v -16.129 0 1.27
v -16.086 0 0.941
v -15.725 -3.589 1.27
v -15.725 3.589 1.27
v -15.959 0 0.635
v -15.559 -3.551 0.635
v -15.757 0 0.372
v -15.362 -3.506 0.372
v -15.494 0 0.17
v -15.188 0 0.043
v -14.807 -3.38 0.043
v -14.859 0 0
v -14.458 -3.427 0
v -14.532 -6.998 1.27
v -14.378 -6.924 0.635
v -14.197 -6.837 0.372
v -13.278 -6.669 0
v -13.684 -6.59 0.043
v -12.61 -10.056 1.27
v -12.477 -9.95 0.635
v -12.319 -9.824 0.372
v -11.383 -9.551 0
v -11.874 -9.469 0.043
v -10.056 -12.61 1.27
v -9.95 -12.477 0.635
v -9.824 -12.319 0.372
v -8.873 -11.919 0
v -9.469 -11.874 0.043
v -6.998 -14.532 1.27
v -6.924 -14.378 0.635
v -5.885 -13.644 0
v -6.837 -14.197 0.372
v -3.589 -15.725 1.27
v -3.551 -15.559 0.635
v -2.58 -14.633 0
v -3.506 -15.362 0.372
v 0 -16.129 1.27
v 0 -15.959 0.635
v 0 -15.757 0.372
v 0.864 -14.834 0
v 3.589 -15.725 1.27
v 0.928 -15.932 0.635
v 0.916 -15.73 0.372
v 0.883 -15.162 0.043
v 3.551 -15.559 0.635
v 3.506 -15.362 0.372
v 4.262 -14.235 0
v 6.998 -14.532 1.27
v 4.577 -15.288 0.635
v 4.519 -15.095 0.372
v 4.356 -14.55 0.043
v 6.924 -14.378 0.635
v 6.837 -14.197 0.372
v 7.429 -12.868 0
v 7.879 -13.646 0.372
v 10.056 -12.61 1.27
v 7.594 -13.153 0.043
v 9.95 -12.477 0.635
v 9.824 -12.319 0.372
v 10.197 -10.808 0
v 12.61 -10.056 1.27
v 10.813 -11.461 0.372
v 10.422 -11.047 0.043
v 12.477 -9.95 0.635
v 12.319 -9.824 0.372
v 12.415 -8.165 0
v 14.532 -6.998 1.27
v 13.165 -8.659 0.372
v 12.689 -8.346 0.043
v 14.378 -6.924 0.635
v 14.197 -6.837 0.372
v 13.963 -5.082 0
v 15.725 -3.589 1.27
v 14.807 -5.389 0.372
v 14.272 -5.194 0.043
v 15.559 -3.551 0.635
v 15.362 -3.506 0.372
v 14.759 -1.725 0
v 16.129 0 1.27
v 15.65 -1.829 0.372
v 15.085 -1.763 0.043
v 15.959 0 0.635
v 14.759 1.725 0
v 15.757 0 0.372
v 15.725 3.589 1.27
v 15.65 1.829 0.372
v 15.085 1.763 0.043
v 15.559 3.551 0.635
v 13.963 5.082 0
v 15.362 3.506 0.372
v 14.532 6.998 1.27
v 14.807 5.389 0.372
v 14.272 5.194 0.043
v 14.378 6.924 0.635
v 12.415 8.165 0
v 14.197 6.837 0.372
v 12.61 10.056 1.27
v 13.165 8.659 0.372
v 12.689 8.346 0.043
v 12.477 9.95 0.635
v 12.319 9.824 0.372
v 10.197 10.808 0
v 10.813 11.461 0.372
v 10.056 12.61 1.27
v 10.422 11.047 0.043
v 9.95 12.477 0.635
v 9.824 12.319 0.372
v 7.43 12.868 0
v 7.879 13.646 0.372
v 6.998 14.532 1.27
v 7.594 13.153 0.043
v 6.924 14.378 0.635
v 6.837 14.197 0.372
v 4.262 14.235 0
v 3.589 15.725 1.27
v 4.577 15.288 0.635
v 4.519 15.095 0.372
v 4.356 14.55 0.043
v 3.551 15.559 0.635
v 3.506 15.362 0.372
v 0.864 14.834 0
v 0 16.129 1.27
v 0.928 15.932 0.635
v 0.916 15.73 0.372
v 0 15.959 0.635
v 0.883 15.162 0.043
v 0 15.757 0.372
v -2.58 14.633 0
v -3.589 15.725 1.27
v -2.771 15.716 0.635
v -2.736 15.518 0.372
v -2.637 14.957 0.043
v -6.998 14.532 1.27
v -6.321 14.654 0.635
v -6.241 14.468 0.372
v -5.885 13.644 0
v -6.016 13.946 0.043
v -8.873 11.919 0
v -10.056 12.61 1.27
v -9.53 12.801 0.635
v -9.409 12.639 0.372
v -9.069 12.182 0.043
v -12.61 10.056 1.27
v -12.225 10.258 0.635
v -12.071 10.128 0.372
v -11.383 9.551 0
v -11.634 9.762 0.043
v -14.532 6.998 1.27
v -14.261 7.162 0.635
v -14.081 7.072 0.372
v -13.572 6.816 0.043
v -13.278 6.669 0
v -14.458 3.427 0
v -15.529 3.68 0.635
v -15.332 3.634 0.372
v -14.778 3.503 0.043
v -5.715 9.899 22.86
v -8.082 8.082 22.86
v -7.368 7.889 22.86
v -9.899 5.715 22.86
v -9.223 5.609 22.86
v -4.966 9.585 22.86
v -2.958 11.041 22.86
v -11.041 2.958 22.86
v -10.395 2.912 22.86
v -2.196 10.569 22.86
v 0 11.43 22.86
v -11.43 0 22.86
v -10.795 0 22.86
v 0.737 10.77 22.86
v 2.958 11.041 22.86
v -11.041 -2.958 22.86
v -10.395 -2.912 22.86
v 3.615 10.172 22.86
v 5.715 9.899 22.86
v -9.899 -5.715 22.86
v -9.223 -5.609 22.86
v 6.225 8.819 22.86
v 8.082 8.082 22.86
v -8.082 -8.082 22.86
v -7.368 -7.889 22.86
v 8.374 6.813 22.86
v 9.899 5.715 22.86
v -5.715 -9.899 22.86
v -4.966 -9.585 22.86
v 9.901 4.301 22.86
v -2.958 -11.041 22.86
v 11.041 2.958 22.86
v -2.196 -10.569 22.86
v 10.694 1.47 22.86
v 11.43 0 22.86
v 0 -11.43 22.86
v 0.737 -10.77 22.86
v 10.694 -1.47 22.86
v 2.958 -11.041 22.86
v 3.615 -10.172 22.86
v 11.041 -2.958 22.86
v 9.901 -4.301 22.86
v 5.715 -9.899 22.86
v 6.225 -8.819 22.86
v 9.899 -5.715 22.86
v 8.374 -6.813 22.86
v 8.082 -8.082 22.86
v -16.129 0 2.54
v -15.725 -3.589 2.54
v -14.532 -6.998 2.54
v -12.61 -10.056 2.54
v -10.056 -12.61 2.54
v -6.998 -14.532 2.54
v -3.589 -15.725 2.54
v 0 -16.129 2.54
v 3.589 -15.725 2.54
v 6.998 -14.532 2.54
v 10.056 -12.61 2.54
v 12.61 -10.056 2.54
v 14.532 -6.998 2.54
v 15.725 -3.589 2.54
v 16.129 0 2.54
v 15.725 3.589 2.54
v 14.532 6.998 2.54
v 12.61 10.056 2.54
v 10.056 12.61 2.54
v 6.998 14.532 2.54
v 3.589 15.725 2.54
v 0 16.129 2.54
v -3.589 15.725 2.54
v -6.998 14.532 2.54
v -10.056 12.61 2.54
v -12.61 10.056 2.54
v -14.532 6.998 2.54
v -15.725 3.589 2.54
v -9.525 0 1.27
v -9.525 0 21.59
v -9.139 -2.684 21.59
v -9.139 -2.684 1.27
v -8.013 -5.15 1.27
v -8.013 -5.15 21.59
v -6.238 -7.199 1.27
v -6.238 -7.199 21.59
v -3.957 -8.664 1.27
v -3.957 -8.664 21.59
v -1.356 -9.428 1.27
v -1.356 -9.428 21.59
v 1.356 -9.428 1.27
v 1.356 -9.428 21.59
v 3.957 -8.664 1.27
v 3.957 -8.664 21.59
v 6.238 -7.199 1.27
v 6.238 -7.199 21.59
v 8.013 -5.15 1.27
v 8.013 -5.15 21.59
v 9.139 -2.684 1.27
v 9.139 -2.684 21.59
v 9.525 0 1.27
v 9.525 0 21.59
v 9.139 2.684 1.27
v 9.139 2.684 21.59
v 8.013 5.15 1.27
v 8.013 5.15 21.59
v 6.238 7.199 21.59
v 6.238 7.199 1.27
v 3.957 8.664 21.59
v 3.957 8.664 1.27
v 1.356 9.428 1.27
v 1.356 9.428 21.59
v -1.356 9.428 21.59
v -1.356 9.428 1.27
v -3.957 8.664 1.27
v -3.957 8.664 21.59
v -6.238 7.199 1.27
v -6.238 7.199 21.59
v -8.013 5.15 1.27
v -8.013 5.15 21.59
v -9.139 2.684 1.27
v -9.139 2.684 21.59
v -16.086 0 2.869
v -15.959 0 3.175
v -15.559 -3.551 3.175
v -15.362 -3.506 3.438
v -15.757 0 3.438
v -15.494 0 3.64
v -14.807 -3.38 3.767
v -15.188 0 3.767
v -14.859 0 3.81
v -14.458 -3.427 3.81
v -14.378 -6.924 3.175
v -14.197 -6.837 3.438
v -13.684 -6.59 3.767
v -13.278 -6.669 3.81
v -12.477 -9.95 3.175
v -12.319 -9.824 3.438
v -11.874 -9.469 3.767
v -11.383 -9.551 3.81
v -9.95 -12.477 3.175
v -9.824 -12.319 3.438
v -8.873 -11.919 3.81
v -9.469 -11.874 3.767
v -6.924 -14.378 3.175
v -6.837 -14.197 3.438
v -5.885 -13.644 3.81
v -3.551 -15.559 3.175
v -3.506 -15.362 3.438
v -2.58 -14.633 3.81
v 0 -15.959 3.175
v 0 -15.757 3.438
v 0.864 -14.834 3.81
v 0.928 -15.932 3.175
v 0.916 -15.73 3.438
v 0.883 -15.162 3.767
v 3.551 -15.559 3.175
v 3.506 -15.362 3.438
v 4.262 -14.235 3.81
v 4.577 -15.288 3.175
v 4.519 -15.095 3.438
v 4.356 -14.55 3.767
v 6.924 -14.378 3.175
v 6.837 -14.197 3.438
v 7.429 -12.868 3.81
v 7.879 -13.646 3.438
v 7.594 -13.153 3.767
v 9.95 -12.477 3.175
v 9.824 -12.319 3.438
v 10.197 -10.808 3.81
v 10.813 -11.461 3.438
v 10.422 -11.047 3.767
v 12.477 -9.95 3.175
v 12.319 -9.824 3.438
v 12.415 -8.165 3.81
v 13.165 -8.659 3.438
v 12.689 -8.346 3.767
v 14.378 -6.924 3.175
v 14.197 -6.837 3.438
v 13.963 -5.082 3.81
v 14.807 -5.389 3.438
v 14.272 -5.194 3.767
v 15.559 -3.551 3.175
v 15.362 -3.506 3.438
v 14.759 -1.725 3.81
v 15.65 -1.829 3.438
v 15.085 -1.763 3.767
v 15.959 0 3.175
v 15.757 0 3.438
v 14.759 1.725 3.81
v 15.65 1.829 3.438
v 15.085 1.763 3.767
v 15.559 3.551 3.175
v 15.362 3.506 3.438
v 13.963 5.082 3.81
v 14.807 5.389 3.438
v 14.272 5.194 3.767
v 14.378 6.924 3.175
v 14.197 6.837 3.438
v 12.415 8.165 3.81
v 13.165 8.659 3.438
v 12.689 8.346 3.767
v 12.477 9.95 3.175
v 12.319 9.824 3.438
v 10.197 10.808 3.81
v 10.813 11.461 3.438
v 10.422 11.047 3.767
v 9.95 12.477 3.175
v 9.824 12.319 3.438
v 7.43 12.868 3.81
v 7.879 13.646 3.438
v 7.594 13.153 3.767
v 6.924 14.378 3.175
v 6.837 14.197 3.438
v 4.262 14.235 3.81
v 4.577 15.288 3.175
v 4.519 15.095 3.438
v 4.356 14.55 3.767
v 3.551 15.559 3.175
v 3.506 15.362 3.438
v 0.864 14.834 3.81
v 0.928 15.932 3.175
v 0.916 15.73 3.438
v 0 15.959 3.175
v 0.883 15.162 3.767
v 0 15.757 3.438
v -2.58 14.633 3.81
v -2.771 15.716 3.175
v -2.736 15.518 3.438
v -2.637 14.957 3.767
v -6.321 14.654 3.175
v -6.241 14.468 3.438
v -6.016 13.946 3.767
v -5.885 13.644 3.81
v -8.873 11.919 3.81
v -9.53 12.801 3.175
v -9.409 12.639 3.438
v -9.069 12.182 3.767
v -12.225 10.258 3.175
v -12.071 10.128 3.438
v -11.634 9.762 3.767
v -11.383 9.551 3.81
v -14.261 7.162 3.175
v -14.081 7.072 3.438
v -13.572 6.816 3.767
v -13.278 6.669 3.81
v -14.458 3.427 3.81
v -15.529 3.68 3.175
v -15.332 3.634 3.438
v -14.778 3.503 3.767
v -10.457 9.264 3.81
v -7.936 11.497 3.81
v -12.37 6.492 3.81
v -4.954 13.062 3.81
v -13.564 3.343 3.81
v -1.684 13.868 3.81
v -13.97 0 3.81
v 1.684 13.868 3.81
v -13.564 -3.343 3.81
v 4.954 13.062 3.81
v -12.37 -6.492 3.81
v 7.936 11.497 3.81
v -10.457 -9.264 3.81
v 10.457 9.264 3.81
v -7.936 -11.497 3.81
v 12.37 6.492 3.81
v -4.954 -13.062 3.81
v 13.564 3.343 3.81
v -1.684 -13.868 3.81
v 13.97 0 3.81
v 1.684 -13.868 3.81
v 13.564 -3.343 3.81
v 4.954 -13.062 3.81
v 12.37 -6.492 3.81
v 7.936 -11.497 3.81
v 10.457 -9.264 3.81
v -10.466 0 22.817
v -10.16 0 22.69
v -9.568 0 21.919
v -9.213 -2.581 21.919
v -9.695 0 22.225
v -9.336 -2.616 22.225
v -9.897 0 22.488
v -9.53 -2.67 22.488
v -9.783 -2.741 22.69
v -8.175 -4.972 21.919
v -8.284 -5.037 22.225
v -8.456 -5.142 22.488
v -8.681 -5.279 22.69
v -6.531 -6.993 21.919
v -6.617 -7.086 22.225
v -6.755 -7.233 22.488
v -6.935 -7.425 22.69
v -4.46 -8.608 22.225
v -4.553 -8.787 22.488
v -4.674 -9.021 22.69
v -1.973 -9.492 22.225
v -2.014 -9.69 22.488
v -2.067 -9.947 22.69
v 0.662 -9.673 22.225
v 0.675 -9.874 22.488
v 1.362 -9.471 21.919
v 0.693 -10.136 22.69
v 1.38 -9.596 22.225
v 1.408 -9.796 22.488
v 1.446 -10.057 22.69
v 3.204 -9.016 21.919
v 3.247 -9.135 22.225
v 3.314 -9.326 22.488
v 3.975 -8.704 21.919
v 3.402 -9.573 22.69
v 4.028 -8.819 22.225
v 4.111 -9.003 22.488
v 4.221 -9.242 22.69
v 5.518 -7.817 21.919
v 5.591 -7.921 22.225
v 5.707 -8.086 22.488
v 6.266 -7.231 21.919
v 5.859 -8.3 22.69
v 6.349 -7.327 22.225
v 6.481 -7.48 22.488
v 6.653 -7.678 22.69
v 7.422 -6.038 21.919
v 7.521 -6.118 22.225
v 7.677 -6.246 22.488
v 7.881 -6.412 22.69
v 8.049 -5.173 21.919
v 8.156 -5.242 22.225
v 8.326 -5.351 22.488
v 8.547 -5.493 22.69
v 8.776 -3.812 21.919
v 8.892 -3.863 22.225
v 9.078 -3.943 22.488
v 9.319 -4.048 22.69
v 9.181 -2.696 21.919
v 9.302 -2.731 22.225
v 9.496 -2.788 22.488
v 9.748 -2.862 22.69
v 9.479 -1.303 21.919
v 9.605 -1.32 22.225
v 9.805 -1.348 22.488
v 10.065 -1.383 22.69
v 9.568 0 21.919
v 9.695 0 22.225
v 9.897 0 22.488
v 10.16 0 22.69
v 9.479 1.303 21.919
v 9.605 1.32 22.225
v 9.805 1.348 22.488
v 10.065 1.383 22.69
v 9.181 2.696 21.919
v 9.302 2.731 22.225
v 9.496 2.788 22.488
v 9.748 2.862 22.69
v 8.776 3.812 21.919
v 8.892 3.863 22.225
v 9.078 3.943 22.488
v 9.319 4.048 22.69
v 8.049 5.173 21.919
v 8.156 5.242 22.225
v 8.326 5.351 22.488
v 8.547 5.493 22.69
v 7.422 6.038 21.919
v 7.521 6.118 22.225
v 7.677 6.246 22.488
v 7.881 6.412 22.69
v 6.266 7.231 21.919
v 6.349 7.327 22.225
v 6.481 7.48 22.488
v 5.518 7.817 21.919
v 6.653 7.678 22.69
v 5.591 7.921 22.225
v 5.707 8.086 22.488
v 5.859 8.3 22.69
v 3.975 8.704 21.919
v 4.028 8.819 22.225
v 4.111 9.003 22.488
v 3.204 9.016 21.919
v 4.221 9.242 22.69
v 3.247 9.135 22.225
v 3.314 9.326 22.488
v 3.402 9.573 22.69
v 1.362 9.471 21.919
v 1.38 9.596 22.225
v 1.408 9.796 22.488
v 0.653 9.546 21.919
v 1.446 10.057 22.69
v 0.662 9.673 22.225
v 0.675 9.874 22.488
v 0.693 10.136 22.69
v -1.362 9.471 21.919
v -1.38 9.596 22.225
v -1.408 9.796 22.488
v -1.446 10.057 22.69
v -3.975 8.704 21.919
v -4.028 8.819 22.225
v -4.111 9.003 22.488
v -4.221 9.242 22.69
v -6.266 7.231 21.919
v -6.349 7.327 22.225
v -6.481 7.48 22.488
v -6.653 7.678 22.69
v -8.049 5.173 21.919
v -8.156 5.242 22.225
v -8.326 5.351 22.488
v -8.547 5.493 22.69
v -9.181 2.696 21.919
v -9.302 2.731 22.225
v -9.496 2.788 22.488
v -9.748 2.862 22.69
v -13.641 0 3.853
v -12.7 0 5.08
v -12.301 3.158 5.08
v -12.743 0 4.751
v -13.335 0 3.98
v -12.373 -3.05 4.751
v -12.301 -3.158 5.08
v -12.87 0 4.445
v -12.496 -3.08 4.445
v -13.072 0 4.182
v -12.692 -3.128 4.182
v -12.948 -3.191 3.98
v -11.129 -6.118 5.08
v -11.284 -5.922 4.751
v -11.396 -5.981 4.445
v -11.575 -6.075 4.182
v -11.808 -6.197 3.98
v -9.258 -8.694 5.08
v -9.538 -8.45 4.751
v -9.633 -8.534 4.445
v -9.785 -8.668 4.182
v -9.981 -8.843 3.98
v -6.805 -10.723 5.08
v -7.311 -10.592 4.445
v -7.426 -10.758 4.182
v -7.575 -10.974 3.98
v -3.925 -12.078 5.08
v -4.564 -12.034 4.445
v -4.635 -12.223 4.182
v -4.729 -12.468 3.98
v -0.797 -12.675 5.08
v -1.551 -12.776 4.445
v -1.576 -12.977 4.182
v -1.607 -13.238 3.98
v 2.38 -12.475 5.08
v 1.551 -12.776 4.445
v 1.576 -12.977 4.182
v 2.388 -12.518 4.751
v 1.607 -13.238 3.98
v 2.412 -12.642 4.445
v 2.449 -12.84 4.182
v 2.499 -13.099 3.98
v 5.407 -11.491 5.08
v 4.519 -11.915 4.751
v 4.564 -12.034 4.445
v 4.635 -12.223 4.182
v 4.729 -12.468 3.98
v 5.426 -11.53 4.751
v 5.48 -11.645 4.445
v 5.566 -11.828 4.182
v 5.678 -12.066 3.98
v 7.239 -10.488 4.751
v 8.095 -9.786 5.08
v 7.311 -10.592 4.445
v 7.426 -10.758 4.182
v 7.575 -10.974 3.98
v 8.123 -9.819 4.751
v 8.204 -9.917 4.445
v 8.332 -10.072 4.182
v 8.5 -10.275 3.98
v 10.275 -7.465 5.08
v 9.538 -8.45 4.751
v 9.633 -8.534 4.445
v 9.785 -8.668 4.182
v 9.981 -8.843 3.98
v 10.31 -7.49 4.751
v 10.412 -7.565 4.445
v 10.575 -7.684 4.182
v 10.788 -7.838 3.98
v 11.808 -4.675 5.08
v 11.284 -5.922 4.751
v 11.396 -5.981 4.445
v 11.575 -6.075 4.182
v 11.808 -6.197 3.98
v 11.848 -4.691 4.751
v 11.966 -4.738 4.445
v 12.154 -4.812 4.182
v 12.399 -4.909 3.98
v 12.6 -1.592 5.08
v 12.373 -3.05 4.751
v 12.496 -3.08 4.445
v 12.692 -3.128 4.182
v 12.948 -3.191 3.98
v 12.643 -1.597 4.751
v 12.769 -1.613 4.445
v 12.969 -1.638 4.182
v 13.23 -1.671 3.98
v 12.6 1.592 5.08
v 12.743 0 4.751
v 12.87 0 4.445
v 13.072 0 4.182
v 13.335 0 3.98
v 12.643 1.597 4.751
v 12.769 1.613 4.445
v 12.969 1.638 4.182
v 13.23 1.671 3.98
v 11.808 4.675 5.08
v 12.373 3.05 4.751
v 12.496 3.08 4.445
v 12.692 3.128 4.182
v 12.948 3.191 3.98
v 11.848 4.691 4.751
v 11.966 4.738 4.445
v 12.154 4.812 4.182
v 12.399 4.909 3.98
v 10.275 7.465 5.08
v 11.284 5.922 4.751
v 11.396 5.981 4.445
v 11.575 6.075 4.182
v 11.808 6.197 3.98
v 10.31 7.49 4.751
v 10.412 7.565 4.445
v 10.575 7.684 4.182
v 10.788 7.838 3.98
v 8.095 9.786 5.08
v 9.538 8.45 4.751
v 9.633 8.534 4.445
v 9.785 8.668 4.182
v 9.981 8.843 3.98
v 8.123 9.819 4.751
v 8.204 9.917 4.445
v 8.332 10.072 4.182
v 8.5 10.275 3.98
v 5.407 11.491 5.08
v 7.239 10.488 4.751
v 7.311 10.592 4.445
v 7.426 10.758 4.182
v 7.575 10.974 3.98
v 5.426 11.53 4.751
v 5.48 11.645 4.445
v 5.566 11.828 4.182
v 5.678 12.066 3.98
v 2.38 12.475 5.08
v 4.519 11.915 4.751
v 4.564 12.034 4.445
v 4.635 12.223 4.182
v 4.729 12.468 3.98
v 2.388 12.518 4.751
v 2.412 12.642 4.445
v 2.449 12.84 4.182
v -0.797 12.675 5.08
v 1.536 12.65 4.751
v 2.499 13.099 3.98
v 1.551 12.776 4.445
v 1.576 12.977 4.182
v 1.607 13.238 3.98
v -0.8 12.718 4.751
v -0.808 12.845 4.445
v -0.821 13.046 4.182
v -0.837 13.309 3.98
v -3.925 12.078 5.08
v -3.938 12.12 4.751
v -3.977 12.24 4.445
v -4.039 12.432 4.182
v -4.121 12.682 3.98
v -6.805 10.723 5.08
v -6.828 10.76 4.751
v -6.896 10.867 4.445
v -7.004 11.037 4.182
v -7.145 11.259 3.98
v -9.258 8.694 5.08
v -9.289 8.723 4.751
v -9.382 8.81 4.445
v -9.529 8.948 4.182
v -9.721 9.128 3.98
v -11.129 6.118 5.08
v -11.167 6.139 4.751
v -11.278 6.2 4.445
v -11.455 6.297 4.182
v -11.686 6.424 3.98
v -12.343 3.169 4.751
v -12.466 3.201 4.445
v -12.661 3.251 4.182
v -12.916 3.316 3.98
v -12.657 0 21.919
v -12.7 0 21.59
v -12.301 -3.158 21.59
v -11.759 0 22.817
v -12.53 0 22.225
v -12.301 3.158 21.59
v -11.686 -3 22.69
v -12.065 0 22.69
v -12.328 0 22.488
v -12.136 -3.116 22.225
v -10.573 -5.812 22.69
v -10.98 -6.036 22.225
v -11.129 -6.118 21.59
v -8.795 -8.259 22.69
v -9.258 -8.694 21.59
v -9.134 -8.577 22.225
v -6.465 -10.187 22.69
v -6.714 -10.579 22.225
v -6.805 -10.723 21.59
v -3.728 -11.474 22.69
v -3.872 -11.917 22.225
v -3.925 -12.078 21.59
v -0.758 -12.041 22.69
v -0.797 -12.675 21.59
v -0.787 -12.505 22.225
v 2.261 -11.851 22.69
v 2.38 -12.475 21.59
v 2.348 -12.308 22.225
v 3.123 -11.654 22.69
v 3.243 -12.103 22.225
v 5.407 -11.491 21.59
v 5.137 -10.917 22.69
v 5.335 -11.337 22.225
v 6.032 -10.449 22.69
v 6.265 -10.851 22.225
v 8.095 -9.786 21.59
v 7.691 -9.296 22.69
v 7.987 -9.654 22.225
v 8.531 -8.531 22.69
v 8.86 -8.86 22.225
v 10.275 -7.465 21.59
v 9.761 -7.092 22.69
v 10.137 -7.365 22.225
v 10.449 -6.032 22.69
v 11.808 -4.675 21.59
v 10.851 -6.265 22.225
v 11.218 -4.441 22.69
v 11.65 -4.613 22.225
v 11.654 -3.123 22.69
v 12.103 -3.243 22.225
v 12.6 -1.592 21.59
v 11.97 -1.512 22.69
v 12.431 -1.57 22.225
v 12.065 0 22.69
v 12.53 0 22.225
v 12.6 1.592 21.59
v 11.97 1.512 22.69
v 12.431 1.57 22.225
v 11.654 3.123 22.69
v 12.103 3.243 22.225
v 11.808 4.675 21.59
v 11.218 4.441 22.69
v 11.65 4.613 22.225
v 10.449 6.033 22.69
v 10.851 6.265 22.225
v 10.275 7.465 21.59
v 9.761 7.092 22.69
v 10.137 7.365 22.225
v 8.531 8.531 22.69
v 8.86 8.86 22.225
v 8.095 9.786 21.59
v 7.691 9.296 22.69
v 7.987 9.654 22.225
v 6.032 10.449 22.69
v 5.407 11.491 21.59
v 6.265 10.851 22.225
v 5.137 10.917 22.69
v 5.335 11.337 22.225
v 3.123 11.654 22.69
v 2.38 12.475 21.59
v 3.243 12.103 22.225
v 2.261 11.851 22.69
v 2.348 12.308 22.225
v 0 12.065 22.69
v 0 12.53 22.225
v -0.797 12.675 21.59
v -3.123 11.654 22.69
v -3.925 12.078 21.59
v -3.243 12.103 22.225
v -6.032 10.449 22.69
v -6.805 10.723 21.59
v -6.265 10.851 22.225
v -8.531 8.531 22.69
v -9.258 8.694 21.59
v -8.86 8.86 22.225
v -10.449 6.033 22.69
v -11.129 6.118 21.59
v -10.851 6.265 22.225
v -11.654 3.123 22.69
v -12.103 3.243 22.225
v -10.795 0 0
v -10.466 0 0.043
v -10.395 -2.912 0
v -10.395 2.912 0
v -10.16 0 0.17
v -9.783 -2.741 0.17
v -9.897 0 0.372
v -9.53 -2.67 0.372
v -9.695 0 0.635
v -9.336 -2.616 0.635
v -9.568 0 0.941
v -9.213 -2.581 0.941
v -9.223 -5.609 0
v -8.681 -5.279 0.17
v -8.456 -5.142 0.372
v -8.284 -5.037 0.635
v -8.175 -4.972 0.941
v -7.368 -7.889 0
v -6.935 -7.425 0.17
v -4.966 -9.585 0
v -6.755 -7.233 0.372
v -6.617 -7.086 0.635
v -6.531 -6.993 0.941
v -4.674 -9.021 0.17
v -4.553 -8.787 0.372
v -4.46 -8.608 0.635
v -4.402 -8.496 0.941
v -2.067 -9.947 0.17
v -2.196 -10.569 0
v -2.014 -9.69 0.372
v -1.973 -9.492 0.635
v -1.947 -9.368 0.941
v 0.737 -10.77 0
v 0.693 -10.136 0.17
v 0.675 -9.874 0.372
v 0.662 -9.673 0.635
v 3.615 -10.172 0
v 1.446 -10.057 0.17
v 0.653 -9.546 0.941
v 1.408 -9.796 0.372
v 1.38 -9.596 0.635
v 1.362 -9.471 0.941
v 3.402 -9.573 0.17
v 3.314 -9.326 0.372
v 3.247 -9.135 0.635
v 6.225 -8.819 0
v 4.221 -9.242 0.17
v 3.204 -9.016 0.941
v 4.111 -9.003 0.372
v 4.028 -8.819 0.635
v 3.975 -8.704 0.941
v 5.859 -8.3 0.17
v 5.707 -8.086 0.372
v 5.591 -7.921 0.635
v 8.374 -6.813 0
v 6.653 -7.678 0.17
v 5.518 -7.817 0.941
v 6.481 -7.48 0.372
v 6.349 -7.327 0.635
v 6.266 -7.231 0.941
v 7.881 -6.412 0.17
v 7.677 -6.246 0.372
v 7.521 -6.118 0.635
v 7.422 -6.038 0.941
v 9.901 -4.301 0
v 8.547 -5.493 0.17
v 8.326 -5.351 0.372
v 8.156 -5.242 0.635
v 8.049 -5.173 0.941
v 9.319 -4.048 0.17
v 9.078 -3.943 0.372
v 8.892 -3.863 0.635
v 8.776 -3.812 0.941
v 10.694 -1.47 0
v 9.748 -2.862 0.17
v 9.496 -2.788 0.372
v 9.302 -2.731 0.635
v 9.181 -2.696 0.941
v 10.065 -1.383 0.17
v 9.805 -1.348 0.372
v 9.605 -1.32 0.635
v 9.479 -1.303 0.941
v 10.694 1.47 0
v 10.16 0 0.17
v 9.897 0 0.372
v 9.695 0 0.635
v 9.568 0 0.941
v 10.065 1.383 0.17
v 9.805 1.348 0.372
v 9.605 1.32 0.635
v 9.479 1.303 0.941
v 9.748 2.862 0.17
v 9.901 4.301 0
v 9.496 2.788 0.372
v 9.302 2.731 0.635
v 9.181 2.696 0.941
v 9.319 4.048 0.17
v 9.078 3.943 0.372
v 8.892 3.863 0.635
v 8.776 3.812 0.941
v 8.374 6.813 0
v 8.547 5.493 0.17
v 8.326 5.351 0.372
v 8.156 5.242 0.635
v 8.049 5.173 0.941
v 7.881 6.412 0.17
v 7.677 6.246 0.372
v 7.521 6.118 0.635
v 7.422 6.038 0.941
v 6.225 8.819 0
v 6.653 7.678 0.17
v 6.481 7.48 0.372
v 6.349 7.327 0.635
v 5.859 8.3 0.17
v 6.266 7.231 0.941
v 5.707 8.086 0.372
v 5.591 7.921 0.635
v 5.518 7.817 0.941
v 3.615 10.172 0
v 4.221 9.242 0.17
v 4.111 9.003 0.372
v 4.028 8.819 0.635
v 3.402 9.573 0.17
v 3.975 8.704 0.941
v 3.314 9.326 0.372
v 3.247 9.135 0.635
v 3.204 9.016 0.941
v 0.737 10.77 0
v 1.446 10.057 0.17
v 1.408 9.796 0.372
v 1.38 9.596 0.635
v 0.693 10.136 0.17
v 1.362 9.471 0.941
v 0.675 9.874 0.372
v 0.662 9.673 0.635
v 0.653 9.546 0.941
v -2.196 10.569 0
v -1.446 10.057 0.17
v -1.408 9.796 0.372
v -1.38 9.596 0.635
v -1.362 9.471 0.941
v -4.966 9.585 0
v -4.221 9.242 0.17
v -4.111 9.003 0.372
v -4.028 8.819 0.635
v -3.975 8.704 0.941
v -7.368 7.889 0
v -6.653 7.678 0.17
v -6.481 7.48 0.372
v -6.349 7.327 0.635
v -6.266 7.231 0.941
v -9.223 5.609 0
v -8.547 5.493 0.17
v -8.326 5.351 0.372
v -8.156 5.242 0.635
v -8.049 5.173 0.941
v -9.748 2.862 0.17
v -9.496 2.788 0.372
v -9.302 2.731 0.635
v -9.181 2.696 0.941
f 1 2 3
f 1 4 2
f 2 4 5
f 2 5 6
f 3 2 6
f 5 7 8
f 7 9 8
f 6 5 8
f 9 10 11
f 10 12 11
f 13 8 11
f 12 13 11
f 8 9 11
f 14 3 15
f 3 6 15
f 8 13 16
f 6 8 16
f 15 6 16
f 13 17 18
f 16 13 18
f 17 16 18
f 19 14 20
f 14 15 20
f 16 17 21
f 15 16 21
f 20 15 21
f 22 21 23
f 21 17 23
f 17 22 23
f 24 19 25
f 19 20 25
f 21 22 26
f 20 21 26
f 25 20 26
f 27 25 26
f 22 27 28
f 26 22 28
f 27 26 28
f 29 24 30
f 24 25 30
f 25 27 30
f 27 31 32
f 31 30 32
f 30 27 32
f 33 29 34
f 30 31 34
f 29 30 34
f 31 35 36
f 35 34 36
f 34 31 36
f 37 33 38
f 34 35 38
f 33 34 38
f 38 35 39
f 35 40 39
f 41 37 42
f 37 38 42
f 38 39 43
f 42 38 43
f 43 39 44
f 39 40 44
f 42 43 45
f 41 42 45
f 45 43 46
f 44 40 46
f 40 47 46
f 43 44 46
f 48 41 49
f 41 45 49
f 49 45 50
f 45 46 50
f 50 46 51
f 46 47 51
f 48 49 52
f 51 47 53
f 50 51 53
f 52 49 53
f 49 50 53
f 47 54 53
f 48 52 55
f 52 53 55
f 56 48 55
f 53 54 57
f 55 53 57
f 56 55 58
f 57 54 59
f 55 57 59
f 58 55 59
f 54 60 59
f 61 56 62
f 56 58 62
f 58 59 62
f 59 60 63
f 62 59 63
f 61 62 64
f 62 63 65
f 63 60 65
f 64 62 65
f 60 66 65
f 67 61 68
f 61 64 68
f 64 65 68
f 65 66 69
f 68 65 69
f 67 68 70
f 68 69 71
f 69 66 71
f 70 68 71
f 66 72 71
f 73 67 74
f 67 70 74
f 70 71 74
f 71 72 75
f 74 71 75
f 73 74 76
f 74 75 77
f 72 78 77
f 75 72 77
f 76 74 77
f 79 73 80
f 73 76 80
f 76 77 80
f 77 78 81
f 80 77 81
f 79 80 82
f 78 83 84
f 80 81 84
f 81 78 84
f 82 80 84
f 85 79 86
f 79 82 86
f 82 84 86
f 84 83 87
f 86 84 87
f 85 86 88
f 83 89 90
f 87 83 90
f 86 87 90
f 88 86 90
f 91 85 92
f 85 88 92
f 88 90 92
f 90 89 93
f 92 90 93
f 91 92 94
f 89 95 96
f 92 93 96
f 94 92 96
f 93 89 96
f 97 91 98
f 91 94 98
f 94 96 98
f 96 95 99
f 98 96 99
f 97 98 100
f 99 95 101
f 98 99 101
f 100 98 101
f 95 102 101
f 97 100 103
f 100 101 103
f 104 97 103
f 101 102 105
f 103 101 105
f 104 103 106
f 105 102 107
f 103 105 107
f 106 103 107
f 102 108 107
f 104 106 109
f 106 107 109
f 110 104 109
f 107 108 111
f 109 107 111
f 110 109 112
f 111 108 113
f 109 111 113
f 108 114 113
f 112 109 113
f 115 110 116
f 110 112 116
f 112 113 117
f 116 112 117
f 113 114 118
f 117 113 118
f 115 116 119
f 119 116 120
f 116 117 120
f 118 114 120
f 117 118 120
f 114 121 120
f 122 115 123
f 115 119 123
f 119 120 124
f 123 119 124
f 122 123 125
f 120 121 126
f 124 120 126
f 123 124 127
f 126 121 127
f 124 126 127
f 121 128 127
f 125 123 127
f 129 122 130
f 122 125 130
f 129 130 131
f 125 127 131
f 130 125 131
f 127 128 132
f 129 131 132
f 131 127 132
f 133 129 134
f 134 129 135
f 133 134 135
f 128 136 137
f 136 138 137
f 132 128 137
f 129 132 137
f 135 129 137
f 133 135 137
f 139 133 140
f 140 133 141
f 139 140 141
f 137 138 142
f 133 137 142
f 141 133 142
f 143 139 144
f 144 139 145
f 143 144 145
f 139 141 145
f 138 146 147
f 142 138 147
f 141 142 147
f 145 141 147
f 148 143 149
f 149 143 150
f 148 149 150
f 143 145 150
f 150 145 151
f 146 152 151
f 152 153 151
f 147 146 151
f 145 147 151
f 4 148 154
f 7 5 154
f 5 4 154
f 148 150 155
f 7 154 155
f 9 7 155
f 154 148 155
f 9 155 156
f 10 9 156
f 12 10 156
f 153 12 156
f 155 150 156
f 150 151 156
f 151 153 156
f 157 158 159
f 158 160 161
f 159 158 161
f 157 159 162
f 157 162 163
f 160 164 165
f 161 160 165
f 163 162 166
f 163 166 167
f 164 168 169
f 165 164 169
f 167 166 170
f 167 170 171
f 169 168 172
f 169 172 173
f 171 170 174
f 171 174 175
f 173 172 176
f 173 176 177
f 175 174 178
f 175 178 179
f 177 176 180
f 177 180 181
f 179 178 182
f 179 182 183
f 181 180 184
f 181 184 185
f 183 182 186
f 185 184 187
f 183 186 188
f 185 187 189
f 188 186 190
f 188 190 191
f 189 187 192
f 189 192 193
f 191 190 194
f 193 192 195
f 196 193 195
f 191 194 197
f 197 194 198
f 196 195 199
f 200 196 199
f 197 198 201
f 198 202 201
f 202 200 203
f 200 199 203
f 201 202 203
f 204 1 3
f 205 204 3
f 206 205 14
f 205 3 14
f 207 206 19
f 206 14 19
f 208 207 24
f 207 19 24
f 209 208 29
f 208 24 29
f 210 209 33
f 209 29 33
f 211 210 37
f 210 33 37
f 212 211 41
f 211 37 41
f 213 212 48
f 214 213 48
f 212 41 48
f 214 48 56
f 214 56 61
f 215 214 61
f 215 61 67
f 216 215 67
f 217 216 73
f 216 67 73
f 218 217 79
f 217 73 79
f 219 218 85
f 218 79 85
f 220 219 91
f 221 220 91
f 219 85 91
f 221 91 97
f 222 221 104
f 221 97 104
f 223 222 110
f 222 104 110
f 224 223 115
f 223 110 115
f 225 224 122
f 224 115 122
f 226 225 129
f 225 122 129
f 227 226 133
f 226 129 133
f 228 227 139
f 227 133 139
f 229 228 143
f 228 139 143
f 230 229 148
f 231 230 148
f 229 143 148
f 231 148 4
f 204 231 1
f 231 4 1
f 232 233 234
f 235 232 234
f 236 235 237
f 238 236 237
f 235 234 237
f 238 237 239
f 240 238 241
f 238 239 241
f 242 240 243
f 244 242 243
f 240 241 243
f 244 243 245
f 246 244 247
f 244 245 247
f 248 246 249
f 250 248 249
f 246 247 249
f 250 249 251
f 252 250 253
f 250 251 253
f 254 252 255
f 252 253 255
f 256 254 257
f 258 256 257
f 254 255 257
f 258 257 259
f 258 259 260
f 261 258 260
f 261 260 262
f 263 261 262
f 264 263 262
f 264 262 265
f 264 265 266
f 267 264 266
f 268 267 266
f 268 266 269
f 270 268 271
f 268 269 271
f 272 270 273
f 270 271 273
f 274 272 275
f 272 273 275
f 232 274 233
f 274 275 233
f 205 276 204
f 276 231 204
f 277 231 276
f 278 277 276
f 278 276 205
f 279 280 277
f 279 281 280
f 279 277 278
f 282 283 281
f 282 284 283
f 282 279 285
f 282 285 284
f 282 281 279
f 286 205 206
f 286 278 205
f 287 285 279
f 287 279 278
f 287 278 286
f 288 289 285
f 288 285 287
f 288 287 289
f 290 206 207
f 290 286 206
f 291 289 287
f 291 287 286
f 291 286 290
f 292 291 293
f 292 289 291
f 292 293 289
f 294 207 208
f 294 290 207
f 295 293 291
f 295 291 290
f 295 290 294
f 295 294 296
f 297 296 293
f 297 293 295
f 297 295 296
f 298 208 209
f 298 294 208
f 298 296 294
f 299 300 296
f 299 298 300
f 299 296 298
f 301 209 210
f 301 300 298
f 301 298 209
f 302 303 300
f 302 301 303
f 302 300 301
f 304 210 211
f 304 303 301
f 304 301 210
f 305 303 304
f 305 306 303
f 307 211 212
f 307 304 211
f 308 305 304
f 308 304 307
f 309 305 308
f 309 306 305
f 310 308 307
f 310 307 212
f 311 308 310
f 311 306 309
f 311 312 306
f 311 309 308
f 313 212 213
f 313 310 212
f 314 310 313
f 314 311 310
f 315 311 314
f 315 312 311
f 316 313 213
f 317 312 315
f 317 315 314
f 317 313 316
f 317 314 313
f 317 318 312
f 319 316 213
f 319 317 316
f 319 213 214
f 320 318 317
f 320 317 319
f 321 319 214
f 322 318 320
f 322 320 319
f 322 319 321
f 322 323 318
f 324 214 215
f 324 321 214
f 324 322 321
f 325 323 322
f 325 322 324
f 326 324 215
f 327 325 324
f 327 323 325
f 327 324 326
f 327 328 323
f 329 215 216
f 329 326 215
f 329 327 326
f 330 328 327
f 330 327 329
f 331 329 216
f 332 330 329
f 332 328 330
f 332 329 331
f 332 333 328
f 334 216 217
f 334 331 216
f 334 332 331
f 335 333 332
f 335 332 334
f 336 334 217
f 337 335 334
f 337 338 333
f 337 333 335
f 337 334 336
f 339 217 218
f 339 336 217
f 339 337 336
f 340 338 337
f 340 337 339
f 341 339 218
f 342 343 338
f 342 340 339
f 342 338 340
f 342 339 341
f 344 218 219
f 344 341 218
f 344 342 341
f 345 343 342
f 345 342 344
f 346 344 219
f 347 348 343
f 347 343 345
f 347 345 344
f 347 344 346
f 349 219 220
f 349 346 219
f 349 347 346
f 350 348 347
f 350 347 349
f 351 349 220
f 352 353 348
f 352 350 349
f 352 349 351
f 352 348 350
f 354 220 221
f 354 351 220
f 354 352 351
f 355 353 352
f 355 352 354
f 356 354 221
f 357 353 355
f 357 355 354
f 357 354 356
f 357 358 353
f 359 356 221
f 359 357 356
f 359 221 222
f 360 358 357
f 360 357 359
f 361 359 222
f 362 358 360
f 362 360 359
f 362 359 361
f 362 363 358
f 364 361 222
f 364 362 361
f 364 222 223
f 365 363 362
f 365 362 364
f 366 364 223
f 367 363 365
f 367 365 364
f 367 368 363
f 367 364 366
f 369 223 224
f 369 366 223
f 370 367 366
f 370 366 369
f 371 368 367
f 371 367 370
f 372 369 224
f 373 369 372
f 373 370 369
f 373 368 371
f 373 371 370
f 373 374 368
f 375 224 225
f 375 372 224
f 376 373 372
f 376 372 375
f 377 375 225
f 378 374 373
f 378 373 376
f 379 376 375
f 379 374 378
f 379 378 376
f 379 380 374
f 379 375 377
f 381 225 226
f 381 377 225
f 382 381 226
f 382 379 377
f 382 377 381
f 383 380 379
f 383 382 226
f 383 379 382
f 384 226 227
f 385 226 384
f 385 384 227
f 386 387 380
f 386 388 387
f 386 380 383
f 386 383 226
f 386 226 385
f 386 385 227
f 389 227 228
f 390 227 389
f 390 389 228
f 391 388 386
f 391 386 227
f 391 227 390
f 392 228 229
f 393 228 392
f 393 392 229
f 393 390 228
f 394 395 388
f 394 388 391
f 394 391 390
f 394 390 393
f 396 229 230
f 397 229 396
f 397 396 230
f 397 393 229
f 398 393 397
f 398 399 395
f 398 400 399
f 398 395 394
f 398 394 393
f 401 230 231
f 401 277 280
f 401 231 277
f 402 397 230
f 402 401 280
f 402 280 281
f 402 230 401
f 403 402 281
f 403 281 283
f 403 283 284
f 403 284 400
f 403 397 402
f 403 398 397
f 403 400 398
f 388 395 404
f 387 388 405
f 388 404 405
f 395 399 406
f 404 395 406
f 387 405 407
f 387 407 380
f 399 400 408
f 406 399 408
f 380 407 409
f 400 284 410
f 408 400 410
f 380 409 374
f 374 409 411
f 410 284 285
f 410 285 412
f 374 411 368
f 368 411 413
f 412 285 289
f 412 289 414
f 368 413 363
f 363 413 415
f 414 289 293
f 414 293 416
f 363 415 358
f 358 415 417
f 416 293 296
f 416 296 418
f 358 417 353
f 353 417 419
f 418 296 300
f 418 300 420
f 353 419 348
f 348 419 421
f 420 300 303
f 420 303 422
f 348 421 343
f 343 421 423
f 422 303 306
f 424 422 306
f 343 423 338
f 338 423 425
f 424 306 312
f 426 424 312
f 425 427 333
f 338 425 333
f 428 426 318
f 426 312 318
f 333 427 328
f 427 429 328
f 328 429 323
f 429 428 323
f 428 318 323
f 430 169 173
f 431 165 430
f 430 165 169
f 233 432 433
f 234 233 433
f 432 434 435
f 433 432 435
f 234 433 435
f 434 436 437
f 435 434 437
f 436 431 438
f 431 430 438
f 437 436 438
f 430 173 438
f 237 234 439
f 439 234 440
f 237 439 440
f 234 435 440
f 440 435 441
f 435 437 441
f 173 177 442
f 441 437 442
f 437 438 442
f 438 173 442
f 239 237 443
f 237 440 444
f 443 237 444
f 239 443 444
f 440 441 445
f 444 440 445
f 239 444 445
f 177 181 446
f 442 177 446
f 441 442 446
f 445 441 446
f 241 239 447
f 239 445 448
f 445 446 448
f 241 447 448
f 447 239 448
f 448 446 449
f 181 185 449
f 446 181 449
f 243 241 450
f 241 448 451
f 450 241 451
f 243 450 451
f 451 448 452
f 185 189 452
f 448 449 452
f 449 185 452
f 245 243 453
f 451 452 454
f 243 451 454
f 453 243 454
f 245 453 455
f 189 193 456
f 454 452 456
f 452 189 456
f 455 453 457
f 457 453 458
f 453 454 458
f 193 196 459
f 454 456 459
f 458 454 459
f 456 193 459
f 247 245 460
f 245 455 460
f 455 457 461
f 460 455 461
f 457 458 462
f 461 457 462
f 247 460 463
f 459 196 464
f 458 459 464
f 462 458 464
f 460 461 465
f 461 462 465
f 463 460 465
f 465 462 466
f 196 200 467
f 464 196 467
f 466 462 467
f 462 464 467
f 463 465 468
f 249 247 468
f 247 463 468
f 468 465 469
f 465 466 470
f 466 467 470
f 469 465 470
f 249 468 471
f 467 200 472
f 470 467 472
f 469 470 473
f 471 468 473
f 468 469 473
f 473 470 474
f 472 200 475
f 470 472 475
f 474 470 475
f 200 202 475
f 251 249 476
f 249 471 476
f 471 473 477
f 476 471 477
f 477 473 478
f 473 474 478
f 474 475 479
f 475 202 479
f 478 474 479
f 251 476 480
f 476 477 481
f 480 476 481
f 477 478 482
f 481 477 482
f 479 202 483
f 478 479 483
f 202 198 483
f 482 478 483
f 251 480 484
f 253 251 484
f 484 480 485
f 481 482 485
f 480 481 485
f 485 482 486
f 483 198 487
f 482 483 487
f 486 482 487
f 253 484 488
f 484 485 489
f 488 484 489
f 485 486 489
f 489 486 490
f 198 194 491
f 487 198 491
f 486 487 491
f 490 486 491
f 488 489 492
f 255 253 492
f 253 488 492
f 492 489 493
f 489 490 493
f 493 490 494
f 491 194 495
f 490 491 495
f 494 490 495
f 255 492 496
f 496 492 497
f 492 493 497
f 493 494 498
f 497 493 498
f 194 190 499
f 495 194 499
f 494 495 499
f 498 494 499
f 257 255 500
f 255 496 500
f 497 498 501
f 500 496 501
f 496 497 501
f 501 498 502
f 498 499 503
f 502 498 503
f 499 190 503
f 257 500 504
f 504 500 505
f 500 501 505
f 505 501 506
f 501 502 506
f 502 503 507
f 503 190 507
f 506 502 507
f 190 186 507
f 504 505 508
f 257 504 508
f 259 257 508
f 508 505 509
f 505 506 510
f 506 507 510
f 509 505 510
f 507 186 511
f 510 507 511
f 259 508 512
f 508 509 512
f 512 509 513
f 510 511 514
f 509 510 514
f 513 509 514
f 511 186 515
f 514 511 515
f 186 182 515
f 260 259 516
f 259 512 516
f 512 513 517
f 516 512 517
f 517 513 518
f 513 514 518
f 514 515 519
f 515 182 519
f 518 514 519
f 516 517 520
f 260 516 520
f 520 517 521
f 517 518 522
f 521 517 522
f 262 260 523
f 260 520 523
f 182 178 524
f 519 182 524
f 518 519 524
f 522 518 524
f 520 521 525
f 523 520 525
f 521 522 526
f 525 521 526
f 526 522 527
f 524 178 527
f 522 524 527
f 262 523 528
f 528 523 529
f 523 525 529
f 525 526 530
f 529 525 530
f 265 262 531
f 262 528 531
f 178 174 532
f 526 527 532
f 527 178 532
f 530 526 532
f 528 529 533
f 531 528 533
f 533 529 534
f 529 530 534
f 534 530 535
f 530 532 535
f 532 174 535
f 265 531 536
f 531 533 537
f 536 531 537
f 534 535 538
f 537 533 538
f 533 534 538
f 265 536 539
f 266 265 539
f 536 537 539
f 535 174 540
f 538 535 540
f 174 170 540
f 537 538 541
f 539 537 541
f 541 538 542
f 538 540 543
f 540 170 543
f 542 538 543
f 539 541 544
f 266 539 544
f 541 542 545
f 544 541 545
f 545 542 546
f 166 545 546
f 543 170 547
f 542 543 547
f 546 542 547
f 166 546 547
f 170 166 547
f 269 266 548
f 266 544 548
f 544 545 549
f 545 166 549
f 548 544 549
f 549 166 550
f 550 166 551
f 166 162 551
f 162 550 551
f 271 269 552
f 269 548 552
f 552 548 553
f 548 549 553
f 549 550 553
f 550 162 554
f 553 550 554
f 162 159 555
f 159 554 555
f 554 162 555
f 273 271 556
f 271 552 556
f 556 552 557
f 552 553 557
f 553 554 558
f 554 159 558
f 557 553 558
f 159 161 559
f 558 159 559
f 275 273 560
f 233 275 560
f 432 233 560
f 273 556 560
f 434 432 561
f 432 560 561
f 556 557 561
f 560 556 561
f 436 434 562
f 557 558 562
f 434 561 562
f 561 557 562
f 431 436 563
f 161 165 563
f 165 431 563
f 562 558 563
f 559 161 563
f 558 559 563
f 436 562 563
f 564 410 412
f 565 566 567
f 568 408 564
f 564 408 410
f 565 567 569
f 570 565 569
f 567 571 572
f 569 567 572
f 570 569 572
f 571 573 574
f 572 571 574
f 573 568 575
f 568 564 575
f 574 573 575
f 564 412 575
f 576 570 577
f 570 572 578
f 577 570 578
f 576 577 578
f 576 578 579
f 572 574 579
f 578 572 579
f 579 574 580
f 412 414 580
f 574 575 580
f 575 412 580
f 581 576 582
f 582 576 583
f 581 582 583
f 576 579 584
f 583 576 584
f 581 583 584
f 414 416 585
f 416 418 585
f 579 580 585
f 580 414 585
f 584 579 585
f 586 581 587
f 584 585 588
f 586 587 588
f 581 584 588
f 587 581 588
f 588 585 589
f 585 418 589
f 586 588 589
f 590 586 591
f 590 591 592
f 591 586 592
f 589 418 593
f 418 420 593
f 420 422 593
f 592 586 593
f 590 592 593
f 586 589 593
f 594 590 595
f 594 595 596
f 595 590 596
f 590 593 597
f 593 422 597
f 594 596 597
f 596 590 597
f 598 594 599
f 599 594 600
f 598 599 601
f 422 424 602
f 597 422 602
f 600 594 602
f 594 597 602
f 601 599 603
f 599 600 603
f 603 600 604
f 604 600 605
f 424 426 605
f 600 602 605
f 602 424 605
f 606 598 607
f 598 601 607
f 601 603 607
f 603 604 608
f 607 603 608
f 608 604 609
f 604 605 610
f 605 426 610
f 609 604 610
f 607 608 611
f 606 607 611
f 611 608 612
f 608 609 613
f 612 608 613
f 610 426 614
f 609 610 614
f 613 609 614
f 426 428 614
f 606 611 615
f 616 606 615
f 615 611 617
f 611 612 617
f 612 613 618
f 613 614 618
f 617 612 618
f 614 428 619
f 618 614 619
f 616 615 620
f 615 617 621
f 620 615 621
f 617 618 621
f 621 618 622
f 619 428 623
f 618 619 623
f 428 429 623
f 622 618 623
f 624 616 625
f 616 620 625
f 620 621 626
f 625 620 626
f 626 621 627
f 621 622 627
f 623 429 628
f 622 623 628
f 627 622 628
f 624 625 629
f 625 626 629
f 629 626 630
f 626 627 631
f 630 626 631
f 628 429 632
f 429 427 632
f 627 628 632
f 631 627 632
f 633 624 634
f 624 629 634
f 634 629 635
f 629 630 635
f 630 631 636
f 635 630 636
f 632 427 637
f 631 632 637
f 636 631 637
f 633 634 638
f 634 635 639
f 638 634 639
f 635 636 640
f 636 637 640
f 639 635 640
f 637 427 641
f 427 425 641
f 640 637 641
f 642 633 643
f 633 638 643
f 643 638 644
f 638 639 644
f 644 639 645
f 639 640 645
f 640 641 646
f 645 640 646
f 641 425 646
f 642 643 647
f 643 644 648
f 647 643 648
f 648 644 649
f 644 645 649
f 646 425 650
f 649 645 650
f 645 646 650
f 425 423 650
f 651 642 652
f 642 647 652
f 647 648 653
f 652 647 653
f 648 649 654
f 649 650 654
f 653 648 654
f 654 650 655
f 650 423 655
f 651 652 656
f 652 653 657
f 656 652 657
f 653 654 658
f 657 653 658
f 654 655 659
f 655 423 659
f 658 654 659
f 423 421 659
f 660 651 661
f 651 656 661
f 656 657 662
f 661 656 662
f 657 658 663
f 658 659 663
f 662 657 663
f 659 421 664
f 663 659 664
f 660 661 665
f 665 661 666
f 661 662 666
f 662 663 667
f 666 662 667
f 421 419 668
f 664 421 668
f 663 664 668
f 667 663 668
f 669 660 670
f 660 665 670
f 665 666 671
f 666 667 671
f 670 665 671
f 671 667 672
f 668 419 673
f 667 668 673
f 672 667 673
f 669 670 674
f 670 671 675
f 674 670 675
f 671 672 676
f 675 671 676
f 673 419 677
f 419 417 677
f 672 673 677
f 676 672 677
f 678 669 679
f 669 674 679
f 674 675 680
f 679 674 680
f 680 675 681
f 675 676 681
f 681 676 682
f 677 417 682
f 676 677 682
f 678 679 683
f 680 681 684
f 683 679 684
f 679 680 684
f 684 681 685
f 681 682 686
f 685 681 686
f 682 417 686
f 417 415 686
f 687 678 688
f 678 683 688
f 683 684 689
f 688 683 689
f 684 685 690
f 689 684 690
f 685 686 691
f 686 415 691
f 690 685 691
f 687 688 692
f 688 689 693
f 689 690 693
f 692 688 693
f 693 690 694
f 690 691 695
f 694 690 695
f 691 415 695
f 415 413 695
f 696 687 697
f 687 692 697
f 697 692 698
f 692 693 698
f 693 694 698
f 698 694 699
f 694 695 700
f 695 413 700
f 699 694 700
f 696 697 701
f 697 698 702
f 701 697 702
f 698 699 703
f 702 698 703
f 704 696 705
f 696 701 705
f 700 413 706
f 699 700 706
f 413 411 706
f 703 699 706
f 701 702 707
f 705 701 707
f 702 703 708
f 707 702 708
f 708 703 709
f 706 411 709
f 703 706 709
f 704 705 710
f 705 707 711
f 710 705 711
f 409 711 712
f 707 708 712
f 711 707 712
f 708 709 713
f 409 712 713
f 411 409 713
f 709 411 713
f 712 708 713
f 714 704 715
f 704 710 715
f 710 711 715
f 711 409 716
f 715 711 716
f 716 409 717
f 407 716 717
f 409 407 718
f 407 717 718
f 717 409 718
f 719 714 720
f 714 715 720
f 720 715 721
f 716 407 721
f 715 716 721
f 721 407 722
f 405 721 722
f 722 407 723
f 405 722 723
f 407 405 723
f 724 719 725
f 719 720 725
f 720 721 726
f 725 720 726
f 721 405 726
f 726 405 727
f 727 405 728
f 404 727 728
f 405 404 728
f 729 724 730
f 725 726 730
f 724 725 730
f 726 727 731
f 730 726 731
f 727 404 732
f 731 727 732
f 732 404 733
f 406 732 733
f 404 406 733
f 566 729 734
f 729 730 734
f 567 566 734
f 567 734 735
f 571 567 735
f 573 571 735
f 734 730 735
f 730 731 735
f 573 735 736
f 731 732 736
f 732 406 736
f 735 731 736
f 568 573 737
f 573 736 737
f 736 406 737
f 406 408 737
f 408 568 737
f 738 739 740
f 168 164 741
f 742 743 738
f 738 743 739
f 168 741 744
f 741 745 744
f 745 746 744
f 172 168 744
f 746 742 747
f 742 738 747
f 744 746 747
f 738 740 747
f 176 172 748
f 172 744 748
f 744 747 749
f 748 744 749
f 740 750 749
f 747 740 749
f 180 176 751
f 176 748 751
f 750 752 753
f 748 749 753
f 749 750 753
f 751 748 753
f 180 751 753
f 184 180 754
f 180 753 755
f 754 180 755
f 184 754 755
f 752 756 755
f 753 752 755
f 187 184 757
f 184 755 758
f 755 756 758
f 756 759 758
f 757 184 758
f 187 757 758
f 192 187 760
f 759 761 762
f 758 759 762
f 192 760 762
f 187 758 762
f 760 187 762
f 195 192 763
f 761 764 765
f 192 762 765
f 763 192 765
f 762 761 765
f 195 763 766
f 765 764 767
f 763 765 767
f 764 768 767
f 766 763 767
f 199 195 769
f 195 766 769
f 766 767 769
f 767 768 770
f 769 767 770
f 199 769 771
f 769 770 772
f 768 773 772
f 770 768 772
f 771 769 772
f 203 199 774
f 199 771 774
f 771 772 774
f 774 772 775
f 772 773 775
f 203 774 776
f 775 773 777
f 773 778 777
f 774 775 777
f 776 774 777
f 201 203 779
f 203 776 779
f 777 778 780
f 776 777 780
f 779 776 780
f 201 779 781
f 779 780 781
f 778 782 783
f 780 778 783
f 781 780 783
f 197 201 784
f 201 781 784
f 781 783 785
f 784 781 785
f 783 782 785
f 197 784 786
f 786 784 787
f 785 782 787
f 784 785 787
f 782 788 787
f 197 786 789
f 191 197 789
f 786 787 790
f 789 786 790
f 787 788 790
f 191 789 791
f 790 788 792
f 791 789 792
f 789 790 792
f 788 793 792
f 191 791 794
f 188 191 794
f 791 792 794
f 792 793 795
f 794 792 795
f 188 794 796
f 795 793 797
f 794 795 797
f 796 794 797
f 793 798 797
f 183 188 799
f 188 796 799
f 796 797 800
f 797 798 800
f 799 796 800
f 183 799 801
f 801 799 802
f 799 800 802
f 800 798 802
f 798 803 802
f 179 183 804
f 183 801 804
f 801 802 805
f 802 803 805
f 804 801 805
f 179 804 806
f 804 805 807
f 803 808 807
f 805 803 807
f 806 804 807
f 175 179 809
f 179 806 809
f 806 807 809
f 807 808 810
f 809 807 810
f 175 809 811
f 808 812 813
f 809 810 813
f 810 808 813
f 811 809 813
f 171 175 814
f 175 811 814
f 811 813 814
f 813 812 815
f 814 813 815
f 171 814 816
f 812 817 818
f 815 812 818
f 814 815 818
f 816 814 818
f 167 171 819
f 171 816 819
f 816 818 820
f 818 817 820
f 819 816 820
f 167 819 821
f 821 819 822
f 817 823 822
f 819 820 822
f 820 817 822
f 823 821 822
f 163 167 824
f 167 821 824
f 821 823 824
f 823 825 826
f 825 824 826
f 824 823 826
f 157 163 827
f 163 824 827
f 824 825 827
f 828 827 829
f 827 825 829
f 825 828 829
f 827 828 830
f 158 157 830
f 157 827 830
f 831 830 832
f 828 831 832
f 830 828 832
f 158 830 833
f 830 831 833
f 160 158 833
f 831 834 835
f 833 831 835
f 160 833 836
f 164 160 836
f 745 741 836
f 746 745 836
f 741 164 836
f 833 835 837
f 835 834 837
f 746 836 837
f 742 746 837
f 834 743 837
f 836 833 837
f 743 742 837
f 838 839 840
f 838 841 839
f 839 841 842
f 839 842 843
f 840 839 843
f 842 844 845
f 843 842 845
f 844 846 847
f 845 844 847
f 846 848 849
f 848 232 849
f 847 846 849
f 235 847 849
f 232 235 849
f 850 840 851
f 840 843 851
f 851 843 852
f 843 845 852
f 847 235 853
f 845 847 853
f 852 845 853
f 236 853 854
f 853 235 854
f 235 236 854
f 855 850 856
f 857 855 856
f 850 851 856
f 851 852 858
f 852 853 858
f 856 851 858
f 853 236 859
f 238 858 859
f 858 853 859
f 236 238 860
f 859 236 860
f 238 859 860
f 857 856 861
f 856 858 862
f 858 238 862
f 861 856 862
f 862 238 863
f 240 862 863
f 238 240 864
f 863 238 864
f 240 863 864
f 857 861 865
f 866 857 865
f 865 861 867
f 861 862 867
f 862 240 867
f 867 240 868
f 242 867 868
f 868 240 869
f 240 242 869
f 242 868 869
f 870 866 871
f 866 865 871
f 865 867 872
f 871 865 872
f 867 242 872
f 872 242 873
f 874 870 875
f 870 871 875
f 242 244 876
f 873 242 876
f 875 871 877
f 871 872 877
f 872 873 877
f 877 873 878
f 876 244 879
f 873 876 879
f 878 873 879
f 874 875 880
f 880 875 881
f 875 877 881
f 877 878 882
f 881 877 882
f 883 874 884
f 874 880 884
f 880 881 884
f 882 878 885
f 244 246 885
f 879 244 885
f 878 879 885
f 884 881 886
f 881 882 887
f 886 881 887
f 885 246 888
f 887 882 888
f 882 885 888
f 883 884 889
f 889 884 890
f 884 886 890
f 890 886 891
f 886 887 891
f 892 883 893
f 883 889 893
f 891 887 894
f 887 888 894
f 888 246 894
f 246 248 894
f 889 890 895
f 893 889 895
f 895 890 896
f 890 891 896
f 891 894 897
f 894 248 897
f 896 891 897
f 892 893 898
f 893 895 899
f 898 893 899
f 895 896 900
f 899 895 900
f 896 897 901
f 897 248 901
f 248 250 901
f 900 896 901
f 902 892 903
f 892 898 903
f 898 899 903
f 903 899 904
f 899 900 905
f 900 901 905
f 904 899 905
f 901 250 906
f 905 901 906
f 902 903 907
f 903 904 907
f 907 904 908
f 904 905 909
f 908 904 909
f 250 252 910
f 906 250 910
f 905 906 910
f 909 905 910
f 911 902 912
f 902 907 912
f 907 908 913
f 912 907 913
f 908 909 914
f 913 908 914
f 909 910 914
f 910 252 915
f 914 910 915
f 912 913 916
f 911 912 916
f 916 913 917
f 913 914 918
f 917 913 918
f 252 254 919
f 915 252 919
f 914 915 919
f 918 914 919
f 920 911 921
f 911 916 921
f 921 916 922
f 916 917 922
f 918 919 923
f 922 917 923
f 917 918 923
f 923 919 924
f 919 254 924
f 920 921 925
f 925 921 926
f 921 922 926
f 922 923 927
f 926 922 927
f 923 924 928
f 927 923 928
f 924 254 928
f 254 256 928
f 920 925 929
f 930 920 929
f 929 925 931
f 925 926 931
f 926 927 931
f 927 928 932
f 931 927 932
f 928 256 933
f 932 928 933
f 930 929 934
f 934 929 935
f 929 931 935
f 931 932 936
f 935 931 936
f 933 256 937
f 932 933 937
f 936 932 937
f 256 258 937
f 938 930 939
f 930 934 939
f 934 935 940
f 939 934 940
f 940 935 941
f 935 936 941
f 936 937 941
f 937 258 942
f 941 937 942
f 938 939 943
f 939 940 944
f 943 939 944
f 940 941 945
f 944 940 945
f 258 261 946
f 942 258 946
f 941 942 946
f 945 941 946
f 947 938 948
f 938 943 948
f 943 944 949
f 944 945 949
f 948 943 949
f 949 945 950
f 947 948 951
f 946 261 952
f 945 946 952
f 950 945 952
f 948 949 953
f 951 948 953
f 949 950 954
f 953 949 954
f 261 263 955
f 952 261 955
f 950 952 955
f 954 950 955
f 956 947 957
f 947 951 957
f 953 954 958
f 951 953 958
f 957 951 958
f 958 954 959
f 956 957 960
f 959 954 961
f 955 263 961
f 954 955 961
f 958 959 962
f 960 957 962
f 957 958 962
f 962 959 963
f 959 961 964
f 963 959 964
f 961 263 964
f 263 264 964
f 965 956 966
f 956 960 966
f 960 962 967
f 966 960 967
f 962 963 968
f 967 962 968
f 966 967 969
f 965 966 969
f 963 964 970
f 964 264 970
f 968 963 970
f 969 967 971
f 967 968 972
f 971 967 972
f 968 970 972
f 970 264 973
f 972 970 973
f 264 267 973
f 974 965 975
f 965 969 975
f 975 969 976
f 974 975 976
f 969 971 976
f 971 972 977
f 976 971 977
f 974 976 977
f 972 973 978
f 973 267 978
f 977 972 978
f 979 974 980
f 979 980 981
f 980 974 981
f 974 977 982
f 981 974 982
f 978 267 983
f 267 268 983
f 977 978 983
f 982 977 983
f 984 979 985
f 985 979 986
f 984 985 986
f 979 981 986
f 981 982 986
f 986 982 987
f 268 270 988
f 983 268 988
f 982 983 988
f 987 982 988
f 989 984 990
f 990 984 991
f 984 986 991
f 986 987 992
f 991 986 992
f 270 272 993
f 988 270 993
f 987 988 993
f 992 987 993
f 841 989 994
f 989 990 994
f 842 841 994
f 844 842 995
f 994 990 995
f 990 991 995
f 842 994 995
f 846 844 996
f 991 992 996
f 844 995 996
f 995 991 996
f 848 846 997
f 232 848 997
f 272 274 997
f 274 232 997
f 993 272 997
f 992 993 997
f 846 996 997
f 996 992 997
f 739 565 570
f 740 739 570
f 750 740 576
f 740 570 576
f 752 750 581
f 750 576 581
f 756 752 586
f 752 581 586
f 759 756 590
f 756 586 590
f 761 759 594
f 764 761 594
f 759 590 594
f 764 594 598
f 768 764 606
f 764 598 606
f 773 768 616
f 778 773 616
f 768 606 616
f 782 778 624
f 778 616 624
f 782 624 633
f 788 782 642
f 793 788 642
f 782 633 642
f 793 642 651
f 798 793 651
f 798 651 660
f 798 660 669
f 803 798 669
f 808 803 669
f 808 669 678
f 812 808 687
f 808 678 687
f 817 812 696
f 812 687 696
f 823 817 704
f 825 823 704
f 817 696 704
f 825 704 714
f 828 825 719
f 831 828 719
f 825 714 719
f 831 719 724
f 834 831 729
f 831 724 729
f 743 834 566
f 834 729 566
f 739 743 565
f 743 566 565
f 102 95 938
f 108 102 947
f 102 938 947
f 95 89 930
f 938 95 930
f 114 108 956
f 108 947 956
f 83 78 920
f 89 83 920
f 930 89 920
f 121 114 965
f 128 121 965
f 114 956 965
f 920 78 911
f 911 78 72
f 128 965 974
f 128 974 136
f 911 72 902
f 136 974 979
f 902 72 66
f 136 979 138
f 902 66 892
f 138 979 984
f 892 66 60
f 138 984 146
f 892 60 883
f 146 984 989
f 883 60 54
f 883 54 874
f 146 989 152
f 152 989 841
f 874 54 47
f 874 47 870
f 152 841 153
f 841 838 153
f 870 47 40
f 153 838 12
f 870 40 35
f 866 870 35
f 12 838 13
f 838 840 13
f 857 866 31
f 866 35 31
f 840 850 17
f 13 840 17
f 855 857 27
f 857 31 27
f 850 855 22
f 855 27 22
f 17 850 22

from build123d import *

# Parameters (mm, degrees)
F2_R = 1.27


with BuildPart() as f1:
    # F0 (on Front) → F1 (revolve)
    with BuildSketch(Plane.XZ):
        Polygon((-16.129, 3.81), (-16.129, 0), (-9.525, 0), (-9.525, 22.86), (-12.7, 22.86), (-12.7, 3.81), align=None)
    revolve(axis=Axis((0, 0, 13.309052), (0, 0, 1)))

    # F2
    f2_edges = [f1.edges().sort_by_distance(p)[0] for p in [
        (12.7, 0, 22.86),
        (9.525, 0, 22.86),
        (12.7, 0, 3.81),
        (16.129, 0, 3.81),
        (16.129, 0, 0),
        (9.525, 0, 0),
    ]]
    fillet(f2_edges, radius=F2_R)


solid = f1.part
